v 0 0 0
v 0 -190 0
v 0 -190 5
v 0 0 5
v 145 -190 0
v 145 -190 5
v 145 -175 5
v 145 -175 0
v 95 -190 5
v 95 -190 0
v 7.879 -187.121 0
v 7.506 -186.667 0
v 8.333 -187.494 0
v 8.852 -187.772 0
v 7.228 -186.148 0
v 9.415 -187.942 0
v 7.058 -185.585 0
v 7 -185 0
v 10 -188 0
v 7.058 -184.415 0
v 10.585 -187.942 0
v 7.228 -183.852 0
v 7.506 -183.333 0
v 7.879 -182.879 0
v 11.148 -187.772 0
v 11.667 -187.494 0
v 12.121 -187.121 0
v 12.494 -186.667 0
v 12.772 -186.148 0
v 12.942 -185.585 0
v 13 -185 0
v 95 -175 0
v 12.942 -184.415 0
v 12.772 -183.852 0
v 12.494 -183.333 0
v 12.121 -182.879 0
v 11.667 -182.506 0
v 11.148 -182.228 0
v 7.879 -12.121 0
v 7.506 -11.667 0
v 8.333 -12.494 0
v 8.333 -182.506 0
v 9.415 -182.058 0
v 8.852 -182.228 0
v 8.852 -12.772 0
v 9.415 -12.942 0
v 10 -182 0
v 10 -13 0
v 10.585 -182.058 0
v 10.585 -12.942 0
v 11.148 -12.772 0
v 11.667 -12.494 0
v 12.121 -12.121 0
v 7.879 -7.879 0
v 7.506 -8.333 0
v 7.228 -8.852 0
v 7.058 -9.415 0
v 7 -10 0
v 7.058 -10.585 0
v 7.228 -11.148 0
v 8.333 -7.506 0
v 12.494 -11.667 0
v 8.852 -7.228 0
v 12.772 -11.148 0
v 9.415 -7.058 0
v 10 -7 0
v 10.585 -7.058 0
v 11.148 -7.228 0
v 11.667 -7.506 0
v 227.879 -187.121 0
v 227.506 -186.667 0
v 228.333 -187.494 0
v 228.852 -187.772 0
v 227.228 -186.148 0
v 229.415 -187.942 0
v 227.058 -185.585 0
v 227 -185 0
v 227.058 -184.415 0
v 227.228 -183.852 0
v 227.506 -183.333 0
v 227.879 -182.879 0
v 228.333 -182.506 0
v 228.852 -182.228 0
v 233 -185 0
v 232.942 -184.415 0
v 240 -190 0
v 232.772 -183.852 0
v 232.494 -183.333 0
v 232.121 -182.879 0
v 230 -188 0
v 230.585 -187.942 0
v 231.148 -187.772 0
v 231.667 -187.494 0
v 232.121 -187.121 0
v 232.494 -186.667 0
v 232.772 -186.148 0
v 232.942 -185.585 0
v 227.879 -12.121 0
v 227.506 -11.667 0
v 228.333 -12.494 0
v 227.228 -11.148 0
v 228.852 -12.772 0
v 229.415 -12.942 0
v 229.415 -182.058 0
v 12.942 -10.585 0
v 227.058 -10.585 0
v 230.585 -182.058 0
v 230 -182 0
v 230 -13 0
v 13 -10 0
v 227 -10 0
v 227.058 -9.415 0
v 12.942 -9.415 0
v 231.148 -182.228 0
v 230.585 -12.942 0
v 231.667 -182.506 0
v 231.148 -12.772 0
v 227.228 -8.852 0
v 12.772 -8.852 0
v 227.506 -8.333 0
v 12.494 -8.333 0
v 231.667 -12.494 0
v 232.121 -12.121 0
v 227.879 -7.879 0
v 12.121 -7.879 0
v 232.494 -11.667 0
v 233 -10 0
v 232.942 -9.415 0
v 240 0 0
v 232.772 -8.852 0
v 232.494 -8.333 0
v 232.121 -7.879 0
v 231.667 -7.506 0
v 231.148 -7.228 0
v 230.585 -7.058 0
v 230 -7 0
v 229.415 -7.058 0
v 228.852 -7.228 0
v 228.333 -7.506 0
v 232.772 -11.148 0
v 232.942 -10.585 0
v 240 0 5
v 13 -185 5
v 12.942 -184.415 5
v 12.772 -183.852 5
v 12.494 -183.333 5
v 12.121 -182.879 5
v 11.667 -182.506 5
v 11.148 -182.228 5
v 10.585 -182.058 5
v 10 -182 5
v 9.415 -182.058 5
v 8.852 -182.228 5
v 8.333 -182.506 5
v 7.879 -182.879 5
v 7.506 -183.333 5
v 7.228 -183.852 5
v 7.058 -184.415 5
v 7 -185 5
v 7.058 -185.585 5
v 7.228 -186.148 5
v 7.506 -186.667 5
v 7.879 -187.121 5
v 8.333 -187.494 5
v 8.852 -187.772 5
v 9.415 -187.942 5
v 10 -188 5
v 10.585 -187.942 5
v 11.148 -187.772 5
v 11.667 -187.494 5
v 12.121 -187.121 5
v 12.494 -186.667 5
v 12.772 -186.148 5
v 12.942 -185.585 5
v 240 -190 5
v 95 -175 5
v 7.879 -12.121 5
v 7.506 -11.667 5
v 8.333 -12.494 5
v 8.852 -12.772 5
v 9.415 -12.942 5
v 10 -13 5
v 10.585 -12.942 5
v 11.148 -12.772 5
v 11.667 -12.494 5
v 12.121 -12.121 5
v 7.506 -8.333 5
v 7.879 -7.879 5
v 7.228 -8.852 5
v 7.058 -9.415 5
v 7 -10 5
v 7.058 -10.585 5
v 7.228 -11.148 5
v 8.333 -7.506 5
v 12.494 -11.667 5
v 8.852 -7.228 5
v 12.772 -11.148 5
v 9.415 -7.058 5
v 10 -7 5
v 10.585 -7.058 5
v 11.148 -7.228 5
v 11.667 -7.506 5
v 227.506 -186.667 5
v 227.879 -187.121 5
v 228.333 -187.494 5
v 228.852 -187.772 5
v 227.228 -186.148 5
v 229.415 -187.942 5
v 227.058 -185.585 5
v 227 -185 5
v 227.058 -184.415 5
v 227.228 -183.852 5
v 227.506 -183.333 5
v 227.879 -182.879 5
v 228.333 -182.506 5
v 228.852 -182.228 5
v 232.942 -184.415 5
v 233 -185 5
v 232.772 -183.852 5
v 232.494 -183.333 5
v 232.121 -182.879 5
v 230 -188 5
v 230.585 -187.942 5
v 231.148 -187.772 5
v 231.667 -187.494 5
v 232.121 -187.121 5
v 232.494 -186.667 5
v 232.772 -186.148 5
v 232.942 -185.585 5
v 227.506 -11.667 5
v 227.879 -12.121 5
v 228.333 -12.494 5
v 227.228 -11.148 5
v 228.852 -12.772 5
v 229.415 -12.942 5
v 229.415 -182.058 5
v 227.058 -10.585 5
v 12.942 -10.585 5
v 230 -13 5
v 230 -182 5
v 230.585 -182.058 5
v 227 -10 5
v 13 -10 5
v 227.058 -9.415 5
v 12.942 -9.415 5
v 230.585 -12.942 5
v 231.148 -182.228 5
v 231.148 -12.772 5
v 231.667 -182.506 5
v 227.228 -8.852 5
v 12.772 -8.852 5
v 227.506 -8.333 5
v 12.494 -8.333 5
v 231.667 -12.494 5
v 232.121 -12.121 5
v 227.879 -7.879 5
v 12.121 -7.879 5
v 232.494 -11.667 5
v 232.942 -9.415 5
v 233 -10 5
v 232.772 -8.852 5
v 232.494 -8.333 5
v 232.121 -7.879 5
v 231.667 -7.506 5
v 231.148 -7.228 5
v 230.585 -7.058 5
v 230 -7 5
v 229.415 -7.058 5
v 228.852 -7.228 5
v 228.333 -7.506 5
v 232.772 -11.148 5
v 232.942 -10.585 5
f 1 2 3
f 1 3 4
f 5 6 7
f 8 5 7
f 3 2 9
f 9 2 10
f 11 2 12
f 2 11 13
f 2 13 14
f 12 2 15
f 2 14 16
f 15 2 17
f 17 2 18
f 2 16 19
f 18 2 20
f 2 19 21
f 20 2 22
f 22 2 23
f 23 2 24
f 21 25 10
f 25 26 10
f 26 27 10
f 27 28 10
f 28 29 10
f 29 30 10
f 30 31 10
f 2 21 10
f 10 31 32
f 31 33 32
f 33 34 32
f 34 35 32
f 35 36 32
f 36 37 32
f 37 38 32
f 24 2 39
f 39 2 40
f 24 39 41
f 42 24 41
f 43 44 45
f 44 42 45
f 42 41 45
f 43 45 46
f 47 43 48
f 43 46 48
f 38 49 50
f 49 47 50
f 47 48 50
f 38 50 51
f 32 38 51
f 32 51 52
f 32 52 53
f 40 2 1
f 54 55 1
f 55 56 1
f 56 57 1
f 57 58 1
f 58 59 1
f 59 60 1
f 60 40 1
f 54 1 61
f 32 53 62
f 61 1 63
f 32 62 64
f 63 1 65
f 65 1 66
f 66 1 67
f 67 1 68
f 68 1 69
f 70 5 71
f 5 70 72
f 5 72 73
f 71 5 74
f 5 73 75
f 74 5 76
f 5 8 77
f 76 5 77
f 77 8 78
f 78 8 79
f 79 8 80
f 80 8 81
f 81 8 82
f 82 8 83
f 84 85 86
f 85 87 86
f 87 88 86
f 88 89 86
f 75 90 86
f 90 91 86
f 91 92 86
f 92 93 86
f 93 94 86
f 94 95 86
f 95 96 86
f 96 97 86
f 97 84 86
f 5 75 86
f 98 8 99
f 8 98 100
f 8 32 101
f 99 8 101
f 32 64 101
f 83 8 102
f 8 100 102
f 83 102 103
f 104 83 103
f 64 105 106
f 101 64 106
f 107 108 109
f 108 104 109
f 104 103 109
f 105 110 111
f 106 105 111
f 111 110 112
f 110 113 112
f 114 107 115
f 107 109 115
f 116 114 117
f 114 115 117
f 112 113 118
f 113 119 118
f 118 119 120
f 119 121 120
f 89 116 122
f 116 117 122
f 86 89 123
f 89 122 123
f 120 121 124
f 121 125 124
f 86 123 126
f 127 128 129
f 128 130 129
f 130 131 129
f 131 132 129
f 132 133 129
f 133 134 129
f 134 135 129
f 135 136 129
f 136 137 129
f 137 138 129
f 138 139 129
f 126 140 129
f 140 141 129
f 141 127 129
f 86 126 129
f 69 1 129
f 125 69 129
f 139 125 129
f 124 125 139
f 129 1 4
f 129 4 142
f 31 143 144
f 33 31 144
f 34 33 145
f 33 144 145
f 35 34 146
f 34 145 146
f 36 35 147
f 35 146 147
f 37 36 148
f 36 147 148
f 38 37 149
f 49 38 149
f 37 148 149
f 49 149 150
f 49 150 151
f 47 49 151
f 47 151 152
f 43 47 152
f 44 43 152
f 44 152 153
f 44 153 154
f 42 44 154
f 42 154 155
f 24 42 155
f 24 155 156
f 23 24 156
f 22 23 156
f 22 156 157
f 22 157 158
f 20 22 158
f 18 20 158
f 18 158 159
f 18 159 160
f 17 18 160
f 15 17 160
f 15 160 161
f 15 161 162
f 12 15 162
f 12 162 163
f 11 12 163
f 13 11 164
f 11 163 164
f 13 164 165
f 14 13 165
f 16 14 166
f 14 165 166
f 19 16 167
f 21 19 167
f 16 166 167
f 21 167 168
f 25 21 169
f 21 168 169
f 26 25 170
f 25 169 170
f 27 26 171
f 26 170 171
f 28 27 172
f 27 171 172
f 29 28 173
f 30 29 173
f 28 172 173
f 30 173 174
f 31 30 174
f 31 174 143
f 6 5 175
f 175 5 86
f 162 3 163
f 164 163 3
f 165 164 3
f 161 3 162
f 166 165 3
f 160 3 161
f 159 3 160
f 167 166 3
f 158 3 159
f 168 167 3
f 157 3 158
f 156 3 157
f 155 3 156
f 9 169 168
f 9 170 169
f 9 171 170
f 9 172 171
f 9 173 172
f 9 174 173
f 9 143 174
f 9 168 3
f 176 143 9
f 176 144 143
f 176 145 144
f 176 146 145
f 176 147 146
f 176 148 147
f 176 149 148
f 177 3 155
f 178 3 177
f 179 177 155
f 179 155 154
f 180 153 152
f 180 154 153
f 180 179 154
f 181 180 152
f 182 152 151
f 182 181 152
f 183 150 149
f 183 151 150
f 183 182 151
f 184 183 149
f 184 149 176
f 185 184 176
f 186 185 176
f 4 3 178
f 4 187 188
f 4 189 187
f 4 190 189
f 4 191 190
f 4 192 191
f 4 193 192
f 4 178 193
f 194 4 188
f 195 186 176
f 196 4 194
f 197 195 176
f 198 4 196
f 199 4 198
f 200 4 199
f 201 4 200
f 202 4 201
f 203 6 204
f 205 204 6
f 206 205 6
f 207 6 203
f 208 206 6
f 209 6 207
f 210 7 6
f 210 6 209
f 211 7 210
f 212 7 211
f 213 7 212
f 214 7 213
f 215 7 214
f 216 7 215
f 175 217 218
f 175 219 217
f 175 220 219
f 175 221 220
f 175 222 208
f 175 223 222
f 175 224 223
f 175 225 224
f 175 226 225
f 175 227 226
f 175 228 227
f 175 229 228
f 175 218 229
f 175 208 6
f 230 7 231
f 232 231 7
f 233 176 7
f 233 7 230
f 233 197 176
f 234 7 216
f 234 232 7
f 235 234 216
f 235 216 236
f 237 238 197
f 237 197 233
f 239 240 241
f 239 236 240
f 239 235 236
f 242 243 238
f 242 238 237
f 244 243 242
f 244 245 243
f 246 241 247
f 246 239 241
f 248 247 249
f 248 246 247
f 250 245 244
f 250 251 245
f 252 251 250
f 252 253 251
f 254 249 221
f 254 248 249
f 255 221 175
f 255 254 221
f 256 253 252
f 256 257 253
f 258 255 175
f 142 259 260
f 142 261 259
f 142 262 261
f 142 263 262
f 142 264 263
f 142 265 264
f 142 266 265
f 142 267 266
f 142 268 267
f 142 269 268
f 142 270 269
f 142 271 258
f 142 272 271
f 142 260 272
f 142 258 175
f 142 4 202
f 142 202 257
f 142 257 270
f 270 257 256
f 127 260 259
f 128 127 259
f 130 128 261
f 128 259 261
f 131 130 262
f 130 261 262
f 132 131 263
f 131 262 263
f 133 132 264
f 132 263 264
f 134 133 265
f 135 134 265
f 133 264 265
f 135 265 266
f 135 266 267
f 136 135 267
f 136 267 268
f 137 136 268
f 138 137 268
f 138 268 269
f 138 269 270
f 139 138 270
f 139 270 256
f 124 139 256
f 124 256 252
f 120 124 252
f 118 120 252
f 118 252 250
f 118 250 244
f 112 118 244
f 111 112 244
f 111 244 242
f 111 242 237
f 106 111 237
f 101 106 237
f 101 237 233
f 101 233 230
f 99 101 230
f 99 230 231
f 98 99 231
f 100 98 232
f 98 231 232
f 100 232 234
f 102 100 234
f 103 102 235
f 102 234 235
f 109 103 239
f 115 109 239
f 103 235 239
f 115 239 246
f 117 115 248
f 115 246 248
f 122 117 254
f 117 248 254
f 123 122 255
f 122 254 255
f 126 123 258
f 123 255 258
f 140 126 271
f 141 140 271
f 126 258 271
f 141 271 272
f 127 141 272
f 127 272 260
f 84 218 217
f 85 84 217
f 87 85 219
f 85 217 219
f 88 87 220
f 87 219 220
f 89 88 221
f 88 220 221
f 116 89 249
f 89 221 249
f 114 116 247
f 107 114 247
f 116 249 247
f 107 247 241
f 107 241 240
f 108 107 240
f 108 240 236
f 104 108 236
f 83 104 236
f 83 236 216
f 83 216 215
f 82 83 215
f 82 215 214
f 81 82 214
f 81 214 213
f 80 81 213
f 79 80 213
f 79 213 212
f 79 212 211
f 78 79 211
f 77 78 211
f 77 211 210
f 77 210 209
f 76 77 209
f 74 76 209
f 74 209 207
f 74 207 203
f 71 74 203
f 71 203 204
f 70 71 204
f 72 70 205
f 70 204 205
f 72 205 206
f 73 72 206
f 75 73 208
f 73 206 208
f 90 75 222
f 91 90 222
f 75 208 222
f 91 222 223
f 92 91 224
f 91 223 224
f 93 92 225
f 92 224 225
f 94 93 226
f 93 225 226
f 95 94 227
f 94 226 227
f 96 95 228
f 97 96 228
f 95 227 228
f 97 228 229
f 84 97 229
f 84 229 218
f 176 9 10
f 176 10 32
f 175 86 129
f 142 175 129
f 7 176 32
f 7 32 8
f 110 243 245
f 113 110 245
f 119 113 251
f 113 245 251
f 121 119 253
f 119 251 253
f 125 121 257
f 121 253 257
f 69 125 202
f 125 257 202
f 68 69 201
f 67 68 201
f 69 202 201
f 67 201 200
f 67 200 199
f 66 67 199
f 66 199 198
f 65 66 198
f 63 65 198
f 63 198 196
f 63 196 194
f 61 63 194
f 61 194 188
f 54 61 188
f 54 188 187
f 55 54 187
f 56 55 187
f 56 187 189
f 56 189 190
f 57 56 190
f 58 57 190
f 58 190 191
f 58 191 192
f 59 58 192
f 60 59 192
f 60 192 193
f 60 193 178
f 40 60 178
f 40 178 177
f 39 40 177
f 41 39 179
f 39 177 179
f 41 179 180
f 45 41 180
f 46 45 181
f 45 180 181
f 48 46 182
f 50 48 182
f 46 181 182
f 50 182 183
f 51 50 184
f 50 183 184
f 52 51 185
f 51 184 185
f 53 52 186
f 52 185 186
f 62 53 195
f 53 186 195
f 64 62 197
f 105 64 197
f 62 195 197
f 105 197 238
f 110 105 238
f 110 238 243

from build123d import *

# Parameters (mm, degrees)
ESQUISSE1_W             = 240
ESQUISSE1_H             = 190
BOSS_EXTRU_1_DEPTH      = 5
ESQUISSE2_W             = 50
ESQUISSE2_H             = 15
ENL_V_MAT_EXTRU_1_DEPTH = 5
ESQUISSE3_R             = 3
ENL_V_MAT_EXTRU_2_DEPTH = 10


with BuildPart() as part:
    # Esquisse1 → Boss.-Extru.1 (new body)
    with BuildSketch(Plane.XY):
        with Locations((120, -95)):
            Rectangle(ESQUISSE1_W, ESQUISSE1_H)
    extrude(amount=BOSS_EXTRU_1_DEPTH)

    # Esquisse2 → Enlèv. mat.-Extru.1 (cut)
    with BuildSketch(Plane.XY.offset(5)):
        with Locations((120, -182.5)):
            Rectangle(ESQUISSE2_W, ESQUISSE2_H)
    extrude(amount=-ENL_V_MAT_EXTRU_1_DEPTH, mode=Mode.SUBTRACT)

    # Esquisse3 → Enlèv. mat.-Extru.2 (cut)
    with BuildSketch(Plane.XY.offset(5)):
        with Locations((10, -10)):
            Circle(ESQUISSE3_R)
        with Locations((10, -185)):
            Circle(ESQUISSE3_R)
        with Locations((230, -185)):
            Circle(ESQUISSE3_R)
        with Locations((230, -10)):
            Circle(ESQUISSE3_R)
    extrude(amount=-ENL_V_MAT_EXTRU_2_DEPTH, mode=Mode.SUBTRACT)


solid = part.part
